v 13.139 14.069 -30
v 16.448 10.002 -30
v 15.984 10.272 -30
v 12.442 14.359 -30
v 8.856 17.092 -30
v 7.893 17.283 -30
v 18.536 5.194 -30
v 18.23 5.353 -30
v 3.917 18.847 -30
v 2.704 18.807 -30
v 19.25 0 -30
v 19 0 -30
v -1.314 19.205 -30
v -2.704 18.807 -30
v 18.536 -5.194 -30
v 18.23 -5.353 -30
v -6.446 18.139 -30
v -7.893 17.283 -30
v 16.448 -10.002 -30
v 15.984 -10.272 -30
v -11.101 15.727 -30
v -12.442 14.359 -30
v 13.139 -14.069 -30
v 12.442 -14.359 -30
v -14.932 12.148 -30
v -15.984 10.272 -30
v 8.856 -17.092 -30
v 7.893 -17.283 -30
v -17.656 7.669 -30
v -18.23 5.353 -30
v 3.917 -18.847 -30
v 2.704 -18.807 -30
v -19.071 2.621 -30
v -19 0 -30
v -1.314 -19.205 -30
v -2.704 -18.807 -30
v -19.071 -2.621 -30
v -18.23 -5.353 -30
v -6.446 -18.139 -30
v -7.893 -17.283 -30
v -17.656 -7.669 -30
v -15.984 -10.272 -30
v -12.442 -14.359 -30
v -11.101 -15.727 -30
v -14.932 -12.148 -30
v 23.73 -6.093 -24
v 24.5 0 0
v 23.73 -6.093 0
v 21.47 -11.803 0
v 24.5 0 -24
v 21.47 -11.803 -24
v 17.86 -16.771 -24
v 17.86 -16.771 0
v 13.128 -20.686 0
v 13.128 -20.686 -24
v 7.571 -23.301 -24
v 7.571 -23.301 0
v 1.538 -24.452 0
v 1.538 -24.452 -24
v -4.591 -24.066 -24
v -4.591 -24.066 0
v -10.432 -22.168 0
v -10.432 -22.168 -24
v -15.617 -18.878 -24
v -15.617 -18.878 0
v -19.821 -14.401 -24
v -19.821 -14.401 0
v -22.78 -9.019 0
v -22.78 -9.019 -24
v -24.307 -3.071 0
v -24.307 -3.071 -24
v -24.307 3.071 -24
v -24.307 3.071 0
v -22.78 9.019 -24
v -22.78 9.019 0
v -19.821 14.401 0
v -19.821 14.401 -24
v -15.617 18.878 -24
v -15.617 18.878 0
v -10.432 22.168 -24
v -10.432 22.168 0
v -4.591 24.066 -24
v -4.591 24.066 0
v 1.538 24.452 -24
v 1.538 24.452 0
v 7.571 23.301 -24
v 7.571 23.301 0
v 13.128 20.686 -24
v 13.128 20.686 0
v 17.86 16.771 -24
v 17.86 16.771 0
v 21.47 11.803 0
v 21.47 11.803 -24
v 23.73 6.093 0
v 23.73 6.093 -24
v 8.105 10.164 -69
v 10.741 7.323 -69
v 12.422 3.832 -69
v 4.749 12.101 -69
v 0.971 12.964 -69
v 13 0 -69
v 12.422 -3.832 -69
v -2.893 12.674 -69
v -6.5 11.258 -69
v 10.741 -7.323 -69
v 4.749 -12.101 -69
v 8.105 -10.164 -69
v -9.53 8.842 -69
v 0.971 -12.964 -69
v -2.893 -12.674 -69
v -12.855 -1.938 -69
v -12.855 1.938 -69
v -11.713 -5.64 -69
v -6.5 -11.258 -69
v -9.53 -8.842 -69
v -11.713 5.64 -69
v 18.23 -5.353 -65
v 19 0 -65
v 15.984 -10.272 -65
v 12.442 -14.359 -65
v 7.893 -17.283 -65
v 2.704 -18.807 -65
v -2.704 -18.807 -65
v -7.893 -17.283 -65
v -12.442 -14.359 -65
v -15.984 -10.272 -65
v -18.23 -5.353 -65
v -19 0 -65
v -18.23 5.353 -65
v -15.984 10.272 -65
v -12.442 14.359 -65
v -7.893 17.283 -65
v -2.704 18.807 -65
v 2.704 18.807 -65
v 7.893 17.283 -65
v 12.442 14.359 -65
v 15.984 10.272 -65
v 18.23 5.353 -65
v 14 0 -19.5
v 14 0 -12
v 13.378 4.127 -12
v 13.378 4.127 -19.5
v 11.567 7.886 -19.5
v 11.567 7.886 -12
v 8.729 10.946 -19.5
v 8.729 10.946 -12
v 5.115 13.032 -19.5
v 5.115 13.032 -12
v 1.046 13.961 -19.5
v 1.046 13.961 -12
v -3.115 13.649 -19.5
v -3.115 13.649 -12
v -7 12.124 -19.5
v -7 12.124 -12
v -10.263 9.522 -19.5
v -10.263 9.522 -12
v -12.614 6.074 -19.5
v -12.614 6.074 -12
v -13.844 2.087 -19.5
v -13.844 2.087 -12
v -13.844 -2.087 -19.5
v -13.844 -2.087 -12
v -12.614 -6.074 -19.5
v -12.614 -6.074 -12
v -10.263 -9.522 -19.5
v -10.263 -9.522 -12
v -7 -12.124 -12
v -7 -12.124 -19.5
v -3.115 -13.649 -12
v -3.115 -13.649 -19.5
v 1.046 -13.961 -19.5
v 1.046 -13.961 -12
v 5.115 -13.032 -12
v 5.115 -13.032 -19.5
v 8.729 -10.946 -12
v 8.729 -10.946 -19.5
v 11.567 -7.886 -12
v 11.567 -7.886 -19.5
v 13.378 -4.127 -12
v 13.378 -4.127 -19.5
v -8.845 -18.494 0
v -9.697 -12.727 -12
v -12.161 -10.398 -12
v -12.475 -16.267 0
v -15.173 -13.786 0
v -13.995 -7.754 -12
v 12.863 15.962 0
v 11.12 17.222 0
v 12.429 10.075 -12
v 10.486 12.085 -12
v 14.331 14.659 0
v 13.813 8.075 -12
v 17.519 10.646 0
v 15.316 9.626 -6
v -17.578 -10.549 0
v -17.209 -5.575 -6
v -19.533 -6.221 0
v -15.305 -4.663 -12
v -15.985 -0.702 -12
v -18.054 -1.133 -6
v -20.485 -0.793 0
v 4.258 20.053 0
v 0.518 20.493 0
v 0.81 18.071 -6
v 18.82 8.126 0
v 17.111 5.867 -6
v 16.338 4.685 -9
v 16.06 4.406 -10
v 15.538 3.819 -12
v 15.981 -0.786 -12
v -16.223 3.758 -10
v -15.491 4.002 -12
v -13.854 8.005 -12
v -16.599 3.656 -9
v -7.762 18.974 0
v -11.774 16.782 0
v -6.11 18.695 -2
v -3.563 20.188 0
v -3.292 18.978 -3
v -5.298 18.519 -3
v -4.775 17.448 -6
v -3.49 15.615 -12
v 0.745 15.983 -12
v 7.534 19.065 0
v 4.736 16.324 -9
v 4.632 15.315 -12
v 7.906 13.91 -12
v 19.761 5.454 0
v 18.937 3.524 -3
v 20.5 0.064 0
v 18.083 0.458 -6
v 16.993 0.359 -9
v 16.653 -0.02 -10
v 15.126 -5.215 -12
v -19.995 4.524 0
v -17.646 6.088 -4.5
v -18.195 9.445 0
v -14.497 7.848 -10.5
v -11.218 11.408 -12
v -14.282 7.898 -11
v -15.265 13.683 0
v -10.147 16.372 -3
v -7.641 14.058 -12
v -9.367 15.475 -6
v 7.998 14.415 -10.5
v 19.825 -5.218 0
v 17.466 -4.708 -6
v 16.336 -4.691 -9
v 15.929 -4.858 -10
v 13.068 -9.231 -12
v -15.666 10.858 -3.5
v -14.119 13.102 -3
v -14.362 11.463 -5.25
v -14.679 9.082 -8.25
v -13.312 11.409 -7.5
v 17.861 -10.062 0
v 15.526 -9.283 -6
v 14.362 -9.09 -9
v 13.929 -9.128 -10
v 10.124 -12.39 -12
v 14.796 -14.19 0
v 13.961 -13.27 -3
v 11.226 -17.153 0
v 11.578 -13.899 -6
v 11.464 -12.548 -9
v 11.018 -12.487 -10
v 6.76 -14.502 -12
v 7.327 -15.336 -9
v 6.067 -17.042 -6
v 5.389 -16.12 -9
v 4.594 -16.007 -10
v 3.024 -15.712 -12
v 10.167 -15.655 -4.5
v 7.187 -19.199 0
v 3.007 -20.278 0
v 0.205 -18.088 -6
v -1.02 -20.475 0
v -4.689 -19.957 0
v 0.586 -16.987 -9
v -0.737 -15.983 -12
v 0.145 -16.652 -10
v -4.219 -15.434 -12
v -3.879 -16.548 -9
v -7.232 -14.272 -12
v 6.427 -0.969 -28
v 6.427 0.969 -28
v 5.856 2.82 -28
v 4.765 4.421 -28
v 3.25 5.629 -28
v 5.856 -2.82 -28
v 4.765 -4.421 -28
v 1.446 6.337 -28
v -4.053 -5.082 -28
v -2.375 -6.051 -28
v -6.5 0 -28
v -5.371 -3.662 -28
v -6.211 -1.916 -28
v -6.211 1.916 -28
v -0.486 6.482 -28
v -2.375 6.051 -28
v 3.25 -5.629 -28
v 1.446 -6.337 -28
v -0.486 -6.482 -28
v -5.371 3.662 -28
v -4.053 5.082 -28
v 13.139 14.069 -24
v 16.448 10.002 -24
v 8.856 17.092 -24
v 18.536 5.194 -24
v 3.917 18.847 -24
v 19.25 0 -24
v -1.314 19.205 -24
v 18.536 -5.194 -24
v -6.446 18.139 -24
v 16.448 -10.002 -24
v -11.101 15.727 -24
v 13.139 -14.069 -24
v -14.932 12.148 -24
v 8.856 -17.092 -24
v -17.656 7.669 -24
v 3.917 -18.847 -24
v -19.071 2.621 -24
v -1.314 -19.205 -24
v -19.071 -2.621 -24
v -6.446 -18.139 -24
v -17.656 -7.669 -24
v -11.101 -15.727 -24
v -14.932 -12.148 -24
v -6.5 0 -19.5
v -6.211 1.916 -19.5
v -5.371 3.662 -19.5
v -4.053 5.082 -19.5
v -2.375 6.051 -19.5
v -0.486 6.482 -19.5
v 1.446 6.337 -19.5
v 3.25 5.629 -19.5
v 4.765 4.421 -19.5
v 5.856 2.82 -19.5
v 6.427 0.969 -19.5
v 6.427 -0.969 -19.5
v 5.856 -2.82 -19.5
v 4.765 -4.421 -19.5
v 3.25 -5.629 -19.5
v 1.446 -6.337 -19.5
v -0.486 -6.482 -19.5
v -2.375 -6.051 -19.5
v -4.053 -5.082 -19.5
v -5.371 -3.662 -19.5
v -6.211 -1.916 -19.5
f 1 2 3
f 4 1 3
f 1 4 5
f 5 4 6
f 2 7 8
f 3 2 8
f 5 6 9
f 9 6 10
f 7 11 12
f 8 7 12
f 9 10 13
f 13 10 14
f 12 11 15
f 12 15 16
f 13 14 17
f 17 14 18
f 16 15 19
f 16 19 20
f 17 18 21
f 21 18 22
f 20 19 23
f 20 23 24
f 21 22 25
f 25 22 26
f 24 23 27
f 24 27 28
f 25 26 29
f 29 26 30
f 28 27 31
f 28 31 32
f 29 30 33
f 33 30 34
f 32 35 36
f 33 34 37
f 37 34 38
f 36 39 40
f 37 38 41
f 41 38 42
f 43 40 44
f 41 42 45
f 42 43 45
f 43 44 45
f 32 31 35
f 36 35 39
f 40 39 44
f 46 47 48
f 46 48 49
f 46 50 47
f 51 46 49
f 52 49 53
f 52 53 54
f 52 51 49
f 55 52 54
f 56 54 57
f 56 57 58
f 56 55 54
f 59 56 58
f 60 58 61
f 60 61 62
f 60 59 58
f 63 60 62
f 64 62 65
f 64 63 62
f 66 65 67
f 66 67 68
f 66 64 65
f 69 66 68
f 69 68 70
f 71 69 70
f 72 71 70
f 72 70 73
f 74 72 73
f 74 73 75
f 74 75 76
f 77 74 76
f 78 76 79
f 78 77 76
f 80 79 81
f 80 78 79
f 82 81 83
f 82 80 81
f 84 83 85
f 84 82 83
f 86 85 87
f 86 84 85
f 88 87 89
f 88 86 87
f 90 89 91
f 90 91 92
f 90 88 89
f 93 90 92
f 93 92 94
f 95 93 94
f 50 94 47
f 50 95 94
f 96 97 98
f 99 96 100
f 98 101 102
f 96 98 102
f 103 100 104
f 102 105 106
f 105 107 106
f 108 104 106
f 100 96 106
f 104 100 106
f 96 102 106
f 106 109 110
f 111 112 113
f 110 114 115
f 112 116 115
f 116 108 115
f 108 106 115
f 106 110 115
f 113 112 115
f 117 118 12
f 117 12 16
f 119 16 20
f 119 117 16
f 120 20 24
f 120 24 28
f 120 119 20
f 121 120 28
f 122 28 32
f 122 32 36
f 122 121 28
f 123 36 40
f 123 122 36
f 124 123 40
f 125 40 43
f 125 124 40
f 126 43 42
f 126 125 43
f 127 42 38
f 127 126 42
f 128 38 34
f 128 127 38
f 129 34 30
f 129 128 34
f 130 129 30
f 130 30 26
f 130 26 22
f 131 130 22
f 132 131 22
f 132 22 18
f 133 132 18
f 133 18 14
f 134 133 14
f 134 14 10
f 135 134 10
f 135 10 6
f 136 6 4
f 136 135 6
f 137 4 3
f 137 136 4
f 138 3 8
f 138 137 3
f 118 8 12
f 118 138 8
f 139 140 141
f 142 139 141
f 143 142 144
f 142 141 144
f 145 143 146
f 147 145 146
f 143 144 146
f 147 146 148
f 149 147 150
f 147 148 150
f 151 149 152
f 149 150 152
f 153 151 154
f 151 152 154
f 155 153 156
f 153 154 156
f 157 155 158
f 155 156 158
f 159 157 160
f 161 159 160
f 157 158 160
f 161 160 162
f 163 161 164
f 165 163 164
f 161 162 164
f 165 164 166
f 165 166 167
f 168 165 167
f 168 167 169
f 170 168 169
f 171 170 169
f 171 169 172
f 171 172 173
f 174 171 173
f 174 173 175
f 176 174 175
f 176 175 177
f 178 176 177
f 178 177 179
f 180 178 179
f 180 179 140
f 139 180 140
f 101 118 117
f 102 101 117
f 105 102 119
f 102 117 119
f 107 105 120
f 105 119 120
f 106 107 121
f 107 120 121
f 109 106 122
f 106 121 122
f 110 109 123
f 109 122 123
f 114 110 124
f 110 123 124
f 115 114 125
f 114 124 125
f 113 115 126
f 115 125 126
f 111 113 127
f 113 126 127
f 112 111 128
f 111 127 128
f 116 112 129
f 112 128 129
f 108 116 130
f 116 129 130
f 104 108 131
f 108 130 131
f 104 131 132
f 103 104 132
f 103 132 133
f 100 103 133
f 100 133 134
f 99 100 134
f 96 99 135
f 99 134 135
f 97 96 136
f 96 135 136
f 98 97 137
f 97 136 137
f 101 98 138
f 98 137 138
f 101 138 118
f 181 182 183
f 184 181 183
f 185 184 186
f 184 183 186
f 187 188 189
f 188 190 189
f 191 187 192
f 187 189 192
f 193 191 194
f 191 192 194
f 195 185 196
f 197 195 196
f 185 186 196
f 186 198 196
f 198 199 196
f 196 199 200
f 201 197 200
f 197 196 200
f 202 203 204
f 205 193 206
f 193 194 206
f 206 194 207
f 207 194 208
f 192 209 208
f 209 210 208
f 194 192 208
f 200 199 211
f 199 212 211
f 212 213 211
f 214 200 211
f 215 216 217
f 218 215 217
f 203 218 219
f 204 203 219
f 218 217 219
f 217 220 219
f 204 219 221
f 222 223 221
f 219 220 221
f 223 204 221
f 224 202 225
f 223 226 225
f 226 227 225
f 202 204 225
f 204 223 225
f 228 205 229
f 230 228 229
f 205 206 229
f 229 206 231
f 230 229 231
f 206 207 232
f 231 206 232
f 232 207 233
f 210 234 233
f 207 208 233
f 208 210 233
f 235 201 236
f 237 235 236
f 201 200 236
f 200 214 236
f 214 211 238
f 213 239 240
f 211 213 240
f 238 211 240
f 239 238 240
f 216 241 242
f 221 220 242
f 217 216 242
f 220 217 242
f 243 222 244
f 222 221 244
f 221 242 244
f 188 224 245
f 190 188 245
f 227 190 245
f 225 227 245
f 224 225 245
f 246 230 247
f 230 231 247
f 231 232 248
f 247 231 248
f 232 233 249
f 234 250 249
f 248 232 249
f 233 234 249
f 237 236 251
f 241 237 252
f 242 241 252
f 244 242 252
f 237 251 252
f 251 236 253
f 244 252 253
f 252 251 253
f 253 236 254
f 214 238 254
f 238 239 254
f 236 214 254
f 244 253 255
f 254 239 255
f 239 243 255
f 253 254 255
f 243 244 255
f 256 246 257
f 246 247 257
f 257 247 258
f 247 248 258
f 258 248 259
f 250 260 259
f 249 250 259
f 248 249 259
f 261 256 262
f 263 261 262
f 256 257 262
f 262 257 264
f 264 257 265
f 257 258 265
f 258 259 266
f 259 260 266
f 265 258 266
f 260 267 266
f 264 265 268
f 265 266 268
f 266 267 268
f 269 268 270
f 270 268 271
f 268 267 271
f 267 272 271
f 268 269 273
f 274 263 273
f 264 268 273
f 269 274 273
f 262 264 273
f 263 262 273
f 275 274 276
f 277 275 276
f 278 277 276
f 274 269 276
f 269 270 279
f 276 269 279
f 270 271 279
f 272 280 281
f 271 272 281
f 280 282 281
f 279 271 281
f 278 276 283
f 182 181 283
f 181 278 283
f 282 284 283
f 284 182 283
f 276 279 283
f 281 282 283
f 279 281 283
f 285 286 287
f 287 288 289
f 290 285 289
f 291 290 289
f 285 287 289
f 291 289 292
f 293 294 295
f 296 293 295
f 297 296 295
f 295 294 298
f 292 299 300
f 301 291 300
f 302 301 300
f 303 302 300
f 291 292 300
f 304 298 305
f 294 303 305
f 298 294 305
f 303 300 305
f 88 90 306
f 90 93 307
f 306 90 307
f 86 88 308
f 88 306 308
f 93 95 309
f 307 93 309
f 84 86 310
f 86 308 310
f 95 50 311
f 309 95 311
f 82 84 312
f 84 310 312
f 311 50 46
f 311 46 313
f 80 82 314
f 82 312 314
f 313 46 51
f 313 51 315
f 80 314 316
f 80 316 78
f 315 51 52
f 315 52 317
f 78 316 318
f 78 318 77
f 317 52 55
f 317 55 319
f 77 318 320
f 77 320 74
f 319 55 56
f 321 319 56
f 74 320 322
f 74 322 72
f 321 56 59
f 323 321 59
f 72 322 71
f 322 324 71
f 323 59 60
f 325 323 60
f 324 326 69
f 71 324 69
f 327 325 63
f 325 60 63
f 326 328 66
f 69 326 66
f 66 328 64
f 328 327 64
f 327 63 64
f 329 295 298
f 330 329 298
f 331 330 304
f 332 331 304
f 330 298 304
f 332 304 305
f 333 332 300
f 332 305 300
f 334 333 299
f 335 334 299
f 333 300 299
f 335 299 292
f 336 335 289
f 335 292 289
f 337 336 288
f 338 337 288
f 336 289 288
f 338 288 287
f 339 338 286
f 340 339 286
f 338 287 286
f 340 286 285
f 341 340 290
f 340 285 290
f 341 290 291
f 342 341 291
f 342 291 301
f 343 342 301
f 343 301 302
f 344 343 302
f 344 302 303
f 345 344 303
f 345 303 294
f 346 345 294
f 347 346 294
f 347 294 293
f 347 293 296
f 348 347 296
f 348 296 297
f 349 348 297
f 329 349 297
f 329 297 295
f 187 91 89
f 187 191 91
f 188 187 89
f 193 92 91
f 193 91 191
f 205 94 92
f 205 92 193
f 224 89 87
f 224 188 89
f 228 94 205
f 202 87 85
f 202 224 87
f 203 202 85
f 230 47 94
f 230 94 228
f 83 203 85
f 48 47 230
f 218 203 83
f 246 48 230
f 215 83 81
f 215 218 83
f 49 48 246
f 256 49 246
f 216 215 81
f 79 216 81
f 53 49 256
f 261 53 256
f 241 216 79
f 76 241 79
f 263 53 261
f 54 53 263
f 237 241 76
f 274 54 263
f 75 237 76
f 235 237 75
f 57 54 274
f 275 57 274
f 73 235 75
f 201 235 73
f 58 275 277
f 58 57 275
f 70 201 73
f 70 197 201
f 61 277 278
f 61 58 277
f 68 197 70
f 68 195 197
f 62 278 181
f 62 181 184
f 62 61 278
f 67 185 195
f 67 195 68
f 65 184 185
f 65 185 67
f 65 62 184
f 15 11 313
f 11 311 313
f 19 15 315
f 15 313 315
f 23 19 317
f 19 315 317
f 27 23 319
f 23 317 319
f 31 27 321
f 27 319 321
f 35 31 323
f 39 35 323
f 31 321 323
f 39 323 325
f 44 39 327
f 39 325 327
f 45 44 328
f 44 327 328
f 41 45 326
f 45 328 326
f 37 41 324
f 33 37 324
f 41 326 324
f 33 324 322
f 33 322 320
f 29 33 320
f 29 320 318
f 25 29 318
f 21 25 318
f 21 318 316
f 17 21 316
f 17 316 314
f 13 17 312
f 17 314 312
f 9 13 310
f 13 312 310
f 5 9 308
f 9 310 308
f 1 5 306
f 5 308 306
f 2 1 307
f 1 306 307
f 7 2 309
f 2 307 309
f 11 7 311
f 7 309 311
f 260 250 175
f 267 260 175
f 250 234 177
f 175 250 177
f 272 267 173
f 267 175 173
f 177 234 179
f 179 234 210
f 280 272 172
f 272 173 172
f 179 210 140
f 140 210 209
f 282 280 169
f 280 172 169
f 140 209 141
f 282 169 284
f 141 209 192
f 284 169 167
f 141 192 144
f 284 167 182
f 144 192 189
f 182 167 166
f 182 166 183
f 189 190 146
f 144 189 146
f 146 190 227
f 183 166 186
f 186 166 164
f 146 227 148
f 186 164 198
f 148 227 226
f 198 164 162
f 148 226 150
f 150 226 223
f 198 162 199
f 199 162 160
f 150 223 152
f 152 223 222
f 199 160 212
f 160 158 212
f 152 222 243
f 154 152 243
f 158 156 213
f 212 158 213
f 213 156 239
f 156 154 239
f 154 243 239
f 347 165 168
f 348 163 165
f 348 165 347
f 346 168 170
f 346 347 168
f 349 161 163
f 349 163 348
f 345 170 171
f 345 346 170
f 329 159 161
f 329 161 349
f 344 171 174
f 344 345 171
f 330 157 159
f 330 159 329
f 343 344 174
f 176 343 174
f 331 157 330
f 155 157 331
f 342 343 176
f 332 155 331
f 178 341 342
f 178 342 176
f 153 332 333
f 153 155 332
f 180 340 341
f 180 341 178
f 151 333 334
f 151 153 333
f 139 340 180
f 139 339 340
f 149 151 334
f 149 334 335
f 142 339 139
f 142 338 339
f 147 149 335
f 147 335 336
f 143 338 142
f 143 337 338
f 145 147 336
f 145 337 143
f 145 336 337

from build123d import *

# Parameters (mm, degrees)
SKETCH1_W         = 24
SKETCH1_H         = 24.5
SKETCH1_W_2       = 39
SKETCH1_H_2       = 19
CHAMFER9_SIZE     = 6
CHAMFER9_SIZE2    = 4
HOLE1_D           = 13
HOLE1_DEPTH       = 16
HOLE1_CBORE_D     = 28
HOLE1_CBORE_DEPTH = 7.5


with BuildPart() as part:
    # Sketch1 → Revolve2 (revolve)
    with BuildSketch(Plane(origin=(0, 0, 0), x_dir=(0, 0, -1), z_dir=(1, 0, 0)), mode=Mode.PRIVATE) as revolve2_sk:
        with Locations((12, 12.25)):
            Rectangle(SKETCH1_W, SKETCH1_H)
        Polygon((24, 19.25), (24, 0), (30, 0), (30, 19), (30, 19.25), align=None)
        with Locations((49.5, 9.5)):
            Rectangle(SKETCH1_W_2, SKETCH1_H_2)
    revolve(revolve2_sk.sketch.rotate(Axis((0, 0, 0), (0, 0, -1)), 90), axis=Axis((0, 0, 0), (0, 0, -1)))

    # Chamfer9
    chamfer9_edges = [part.edges().sort_by_distance(p)[0] for p in [
        (-19, 0, -69),
    ]]
    chamfer9_side = [part.faces().sort_by_distance(p)[0] for p in [
        (0, 0, -69),
    ]]
    chamfer(chamfer9_edges, length=CHAMFER9_SIZE, length2=CHAMFER9_SIZE2, reference=chamfer9_side[0])

    # Cut-Loft1: read off the stored shape, not the designer's step
    # Cut-Loft1: loft between two sections, ruled curve by curve
    cut_loft1_from = [
        Edge.make_bspline([(14.330823066, 14.658700837, 0), (43.648224741, -14.002945296, 0), (14.986578608, -43.32034697, 0), (-14.330823066, -14.658700837, 0), (-43.648224741, 14.002945296, 0), (-14.986578608, 43.32034697, 0), (14.330823066, 14.658700837, 0)], [0, 0, 0, 0, 0.5, 0.5, 0.5, 1, 1, 1, 1], 3, [1, 0.333333333, 0.333333333, 1, 0.333333333, 0.333333333, 1]),
    ]
    cut_loft1_to = [
        Edge.make_bspline([(13.812637818, 8.07533507, -12), (29.963307959, -19.549940567, -12), (2.338032322, -35.700610707, -12), (-13.812637818, -8.07533507, -12), (-29.963307959, 19.549940567, -12), (-2.338032322, 35.700610707, -12), (13.812637818, 8.07533507, -12)], [0, 0, 0, 0, 0.5, 0.5, 0.5, 1, 1, 1, 1], 3, [1, 0.333333333, 0.333333333, 1, 0.333333333, 0.333333333, 1]),
    ]
    cut_loft1 = Solid(Shell([*[Face.make_surface_from_curves(cut_loft1_from[k], cut_loft1_to[k]) for k in range(1)], Face(Wire(cut_loft1_from)), Face(Wire(cut_loft1_to))]))
    add(cut_loft1, mode=Mode.SUBTRACT)

    # Hole1
    with Locations(Plane.XY.offset(-12)):
        with Locations((0, 0)):
            CounterBoreHole(HOLE1_D / 2, HOLE1_CBORE_D / 2, HOLE1_CBORE_DEPTH, depth=HOLE1_DEPTH)


solid = part.part
